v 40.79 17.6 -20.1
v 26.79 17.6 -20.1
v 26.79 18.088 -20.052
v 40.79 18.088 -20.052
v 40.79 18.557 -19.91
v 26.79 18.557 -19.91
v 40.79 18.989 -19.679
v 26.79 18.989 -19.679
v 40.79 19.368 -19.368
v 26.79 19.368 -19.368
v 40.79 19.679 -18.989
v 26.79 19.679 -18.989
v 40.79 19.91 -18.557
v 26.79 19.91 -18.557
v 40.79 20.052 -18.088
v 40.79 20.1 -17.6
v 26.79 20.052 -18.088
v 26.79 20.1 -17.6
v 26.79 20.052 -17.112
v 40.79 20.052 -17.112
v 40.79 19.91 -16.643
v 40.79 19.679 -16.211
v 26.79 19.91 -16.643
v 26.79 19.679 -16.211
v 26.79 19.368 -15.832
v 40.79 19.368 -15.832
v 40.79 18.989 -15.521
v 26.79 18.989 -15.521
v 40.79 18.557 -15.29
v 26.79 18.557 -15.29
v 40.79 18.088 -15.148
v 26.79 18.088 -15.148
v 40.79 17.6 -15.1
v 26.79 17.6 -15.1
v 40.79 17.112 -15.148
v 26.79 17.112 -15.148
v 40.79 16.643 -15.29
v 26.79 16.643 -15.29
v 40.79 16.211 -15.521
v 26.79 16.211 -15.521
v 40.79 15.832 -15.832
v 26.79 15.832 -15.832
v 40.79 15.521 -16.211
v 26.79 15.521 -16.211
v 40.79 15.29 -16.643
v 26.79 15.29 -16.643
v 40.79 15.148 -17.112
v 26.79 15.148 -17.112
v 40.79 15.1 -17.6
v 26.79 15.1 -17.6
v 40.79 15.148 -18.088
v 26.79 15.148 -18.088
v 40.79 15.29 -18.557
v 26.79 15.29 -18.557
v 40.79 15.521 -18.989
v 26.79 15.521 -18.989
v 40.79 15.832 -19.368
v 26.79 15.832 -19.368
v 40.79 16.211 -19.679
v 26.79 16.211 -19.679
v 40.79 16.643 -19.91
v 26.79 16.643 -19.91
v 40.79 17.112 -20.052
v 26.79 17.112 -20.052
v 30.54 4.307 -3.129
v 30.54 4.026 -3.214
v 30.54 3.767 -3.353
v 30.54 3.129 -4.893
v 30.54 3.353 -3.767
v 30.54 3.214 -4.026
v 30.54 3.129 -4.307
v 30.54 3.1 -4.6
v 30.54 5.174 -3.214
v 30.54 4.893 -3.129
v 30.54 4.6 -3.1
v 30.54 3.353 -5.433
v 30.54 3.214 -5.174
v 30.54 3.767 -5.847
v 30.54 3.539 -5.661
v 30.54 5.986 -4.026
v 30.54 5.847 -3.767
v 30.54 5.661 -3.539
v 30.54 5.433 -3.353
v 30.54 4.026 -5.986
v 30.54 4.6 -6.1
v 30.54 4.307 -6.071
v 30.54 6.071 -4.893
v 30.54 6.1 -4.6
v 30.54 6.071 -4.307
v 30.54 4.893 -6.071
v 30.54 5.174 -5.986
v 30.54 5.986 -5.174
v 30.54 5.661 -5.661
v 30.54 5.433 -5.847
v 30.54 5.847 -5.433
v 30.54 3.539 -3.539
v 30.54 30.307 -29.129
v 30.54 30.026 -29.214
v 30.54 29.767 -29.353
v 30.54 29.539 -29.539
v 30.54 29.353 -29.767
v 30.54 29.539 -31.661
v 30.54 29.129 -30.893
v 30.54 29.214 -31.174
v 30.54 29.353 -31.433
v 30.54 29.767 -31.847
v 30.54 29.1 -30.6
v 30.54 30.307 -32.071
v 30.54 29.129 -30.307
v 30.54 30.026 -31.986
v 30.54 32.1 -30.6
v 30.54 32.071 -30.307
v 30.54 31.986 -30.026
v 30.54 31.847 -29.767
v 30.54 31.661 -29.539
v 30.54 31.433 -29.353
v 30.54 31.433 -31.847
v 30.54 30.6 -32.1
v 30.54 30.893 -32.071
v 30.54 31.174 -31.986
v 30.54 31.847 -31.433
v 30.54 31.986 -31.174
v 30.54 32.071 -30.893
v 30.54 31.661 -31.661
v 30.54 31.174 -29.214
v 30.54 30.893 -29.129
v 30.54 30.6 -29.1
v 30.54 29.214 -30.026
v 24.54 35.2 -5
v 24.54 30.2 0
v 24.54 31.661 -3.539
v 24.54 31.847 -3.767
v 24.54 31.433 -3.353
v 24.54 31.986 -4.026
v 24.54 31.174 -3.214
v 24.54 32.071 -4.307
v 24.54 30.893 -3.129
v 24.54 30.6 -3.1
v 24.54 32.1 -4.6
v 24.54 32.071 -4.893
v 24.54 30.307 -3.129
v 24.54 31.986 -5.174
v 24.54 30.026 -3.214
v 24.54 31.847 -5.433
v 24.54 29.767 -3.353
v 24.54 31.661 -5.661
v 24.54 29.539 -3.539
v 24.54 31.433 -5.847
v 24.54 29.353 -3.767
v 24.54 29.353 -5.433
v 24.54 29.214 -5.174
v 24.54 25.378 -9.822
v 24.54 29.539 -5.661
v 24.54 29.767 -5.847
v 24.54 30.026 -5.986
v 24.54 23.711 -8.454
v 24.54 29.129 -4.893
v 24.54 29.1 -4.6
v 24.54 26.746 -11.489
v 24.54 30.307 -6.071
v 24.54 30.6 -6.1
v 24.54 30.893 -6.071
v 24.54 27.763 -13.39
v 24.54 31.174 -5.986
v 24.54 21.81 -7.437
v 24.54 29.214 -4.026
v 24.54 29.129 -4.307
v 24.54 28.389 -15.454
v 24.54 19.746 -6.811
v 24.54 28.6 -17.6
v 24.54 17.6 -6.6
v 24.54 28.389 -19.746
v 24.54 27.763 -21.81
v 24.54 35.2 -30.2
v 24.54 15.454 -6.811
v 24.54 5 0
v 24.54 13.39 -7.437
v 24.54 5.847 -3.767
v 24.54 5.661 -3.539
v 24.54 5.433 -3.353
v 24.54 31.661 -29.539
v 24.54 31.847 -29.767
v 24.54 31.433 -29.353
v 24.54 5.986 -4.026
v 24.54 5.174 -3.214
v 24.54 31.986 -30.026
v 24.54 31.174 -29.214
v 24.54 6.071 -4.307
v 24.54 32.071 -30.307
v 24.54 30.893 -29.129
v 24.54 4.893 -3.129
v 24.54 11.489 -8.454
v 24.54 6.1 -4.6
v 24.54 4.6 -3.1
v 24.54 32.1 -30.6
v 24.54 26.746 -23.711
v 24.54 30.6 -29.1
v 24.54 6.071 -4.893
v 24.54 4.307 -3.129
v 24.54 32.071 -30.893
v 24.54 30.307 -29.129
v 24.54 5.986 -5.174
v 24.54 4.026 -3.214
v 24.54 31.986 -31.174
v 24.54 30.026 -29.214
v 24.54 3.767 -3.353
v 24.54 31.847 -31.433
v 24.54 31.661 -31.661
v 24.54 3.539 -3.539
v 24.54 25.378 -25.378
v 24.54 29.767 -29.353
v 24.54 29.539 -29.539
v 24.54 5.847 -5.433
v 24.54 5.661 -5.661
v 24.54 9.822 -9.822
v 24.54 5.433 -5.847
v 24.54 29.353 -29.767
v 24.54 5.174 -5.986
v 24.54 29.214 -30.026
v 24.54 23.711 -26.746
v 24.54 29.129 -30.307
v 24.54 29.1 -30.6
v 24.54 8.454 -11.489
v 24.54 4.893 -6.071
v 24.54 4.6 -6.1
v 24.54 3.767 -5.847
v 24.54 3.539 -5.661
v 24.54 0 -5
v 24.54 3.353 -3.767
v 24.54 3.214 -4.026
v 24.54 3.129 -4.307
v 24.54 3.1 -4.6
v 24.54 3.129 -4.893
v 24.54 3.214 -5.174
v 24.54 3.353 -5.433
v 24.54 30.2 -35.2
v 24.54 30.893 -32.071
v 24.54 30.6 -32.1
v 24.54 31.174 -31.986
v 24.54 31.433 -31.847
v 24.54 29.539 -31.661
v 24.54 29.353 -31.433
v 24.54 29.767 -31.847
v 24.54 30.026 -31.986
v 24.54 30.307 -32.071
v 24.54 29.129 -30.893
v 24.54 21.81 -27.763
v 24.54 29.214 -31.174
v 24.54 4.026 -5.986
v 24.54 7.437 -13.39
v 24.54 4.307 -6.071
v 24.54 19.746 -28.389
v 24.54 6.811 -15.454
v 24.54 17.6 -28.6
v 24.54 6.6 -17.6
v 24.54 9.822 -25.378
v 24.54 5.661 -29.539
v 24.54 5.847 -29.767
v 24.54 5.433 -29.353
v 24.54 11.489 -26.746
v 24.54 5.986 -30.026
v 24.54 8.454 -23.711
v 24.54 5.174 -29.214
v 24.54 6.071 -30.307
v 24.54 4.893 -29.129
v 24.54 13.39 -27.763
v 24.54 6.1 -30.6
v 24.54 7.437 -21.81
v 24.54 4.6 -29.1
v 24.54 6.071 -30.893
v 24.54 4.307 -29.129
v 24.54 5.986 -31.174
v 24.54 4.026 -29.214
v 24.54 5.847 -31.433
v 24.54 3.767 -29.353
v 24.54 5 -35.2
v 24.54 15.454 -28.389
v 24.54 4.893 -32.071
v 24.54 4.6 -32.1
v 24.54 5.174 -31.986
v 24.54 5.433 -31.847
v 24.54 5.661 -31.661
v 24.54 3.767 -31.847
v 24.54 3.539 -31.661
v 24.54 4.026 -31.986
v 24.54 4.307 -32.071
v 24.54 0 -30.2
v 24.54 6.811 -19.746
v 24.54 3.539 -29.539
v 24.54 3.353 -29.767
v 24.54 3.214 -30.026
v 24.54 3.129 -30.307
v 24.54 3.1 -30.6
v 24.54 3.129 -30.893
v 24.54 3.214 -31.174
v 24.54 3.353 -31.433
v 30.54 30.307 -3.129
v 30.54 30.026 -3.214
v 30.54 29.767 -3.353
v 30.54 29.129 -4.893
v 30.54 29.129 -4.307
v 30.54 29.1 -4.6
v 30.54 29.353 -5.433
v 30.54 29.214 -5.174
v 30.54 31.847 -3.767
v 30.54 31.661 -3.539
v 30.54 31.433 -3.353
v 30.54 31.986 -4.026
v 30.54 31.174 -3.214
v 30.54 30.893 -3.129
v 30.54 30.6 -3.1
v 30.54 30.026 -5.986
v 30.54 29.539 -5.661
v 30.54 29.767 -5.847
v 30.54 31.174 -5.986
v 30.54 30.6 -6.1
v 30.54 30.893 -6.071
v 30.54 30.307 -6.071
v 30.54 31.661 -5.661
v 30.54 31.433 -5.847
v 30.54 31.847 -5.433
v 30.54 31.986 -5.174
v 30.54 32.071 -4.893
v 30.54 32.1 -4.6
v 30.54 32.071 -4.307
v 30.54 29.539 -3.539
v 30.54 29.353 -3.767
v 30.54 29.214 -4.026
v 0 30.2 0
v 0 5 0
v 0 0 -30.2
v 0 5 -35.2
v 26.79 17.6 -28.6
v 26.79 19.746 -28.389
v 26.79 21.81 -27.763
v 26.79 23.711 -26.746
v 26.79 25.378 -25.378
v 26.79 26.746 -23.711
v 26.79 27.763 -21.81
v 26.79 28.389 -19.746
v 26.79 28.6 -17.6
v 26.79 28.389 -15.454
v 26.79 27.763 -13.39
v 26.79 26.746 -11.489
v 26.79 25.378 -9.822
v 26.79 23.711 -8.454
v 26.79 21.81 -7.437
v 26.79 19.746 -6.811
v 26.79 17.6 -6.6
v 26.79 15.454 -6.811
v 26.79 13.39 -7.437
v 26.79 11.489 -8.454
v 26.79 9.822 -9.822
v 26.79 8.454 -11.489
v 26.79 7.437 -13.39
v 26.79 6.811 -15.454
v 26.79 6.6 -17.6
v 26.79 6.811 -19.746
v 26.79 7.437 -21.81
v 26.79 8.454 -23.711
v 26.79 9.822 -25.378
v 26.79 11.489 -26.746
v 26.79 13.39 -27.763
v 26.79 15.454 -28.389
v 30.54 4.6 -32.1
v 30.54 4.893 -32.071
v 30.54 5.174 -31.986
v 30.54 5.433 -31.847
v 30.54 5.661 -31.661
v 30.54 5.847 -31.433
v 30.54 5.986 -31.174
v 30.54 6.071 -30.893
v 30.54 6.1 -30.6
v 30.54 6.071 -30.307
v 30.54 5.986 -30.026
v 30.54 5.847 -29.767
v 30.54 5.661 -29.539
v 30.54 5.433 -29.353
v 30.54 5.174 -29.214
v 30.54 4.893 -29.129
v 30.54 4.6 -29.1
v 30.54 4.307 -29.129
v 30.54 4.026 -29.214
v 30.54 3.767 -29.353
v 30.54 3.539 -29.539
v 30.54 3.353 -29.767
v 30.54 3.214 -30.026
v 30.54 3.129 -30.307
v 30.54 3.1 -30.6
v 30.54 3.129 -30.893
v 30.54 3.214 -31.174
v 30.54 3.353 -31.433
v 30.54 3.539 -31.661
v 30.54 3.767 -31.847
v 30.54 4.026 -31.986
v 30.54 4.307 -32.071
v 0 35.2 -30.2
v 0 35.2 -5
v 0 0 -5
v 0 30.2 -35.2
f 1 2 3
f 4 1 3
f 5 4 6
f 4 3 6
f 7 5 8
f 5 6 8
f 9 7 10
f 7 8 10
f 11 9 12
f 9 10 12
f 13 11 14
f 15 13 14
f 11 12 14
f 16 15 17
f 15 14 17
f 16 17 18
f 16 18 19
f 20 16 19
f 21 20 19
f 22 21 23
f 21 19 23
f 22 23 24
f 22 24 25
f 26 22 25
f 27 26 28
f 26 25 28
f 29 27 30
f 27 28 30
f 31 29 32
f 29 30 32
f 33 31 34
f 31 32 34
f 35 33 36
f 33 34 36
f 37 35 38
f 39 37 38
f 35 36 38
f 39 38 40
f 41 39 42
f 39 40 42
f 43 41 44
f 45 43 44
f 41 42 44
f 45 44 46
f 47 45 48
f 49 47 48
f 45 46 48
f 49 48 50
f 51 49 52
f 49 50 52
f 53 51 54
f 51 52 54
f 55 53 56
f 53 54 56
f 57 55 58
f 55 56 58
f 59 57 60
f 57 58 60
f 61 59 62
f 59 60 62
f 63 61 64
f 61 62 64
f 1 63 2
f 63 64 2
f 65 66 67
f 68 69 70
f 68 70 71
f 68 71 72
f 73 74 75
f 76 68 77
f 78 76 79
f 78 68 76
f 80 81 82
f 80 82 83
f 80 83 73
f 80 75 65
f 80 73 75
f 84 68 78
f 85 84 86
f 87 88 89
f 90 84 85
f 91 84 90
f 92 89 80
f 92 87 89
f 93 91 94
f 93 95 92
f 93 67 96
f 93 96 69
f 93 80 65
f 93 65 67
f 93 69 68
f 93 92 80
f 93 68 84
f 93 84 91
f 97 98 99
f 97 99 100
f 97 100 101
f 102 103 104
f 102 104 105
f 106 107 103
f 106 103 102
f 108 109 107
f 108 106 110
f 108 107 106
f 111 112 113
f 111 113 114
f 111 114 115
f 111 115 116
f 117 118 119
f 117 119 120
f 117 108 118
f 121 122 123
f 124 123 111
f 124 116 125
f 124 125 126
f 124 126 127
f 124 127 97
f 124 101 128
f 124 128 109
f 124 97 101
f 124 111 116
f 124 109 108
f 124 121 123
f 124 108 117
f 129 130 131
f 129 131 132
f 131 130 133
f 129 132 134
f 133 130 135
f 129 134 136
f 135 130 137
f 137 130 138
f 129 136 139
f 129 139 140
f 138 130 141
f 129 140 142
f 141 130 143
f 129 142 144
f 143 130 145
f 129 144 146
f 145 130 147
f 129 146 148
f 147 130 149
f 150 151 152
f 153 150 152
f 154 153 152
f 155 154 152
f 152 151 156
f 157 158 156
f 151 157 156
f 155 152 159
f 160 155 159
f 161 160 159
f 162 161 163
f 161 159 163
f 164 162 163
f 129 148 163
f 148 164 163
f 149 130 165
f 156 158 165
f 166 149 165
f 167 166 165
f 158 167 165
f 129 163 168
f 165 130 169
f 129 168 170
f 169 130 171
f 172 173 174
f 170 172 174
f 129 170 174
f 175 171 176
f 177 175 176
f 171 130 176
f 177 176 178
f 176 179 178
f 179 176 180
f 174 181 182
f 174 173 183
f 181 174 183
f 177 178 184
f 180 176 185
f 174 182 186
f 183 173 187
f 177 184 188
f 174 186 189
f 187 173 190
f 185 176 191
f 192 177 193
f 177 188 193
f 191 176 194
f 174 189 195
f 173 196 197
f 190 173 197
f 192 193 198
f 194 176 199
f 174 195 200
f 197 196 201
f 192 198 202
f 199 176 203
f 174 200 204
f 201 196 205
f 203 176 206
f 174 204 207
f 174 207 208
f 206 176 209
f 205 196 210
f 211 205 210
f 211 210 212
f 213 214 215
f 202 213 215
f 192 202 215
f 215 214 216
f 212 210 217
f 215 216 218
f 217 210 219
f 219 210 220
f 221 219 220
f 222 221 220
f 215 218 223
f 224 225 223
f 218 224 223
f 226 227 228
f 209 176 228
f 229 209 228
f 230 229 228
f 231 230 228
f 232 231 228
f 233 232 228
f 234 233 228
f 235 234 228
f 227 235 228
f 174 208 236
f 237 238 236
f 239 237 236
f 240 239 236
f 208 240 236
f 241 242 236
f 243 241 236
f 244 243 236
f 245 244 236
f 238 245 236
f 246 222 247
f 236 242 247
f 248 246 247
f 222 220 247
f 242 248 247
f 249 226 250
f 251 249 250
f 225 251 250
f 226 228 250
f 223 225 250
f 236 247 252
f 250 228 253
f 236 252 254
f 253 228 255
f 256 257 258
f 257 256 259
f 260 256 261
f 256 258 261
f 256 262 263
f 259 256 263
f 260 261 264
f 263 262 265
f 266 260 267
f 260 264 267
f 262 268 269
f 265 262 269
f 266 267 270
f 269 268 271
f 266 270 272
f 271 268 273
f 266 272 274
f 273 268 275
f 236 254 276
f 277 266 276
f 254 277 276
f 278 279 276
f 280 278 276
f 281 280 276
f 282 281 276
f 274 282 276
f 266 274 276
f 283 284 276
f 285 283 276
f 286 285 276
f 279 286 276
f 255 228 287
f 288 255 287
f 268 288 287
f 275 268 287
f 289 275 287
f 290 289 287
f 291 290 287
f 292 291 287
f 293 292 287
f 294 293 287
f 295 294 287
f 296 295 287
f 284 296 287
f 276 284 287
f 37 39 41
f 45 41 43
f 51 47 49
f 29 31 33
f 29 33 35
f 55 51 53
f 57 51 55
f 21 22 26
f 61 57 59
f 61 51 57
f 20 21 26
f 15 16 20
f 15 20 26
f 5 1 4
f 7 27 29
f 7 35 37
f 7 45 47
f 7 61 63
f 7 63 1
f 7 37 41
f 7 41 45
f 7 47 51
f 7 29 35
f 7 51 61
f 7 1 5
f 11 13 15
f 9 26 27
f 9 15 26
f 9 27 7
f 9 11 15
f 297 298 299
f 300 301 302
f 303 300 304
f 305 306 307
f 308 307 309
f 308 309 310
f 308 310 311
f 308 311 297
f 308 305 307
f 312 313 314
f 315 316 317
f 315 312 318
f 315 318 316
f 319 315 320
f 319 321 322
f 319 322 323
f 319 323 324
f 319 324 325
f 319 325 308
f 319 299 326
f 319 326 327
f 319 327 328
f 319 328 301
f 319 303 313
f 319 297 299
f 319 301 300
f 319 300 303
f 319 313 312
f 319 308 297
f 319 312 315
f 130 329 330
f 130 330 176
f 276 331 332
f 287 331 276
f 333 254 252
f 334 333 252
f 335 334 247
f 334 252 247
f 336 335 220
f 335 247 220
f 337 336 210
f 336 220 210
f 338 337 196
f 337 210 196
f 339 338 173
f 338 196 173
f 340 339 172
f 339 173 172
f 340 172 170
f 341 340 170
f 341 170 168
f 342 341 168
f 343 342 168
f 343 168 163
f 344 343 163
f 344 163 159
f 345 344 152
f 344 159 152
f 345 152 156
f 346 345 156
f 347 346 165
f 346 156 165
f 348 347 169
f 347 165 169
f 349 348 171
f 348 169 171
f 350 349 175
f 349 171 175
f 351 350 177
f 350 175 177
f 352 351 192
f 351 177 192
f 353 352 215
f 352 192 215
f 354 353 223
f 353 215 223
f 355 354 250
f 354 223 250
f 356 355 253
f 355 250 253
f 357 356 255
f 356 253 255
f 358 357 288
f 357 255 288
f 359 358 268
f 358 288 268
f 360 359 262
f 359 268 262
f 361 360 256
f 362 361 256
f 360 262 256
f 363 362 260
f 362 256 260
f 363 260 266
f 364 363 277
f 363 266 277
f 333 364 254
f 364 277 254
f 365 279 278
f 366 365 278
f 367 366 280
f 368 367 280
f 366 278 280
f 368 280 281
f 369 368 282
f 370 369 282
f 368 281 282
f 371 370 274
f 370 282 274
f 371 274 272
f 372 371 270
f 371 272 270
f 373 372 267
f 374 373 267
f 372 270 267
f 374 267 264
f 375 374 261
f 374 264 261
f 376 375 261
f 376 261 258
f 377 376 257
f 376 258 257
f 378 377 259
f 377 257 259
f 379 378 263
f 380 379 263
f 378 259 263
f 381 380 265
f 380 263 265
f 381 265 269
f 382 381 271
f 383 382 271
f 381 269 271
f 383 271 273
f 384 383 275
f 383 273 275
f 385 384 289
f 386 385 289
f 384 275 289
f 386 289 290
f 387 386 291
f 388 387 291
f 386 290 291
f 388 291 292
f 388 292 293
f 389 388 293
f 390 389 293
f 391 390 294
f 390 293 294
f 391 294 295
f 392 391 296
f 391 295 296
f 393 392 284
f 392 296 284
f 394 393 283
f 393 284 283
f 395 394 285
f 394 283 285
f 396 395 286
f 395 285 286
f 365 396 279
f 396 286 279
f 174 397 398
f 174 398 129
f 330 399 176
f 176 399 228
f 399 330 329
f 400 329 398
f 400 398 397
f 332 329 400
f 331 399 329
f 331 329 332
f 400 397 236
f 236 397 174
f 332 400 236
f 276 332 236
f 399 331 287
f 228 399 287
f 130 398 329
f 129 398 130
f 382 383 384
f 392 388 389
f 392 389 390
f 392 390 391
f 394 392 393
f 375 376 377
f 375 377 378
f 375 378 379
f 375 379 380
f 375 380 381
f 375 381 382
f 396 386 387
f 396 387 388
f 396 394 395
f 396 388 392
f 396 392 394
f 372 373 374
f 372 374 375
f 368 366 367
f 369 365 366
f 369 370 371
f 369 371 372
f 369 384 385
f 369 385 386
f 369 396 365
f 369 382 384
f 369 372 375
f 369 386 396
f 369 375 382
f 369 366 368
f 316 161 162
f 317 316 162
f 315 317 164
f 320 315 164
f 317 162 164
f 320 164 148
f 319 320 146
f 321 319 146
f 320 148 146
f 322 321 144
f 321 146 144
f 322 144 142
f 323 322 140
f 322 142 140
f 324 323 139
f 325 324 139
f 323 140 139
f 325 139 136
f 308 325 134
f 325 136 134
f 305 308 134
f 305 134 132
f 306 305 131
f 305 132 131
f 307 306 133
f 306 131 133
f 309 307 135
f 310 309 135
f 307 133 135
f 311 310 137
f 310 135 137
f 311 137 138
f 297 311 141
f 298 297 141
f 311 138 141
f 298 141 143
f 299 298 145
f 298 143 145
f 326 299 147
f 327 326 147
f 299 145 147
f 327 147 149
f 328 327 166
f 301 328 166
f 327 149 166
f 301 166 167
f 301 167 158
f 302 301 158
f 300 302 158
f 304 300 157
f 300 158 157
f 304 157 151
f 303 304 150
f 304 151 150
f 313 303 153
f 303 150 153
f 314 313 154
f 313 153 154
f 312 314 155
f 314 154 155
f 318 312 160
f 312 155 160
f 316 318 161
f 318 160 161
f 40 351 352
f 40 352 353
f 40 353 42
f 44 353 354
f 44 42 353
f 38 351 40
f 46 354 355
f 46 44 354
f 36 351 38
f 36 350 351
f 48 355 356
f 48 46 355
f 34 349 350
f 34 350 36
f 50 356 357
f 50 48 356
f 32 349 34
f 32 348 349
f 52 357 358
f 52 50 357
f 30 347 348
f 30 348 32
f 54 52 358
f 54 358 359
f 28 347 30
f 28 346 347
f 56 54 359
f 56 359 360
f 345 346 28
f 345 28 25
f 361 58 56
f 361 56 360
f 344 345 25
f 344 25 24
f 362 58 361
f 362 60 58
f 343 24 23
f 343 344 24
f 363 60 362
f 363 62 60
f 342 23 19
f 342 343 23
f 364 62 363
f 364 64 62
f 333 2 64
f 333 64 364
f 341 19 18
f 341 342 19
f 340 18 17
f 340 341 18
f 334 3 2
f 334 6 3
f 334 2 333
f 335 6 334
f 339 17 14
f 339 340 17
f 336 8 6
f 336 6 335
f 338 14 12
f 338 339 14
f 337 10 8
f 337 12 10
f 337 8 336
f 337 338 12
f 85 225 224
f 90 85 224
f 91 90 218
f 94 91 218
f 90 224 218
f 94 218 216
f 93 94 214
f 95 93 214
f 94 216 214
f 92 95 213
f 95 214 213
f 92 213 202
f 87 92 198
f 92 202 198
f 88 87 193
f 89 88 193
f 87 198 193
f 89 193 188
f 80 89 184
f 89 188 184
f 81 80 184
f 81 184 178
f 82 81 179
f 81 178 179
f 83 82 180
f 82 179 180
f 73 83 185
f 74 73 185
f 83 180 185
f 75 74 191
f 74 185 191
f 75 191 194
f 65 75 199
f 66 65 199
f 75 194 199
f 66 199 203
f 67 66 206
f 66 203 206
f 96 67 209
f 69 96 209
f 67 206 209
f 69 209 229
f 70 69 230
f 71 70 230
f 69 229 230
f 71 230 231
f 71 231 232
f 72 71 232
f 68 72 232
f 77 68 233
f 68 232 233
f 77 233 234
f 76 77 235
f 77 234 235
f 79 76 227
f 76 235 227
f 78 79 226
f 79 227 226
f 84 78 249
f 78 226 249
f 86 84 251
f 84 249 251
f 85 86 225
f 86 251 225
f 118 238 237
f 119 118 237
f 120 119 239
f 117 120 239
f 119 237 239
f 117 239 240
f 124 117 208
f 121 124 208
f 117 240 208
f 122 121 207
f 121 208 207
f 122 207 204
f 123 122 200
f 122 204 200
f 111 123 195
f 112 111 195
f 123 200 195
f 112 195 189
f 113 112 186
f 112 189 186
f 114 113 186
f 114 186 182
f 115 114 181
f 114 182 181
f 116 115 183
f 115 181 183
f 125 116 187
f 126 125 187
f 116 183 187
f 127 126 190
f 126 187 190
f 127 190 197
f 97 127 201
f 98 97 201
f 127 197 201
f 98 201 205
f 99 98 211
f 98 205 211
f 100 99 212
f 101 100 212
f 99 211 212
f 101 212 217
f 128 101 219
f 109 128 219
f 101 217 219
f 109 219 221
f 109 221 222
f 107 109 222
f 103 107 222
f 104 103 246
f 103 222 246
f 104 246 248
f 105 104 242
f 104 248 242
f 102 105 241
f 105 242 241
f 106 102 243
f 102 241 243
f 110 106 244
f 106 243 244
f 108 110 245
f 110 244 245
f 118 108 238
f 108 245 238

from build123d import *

# Parameters (mm, degrees)
SKETCH1_W           = 24.54
SKETCH1_H           = 35.2
MAIN_BODY_DEPTH     = 35.2
SKETCH2_R           = 11
LIP_DEPTH           = 2.25
SKETCH3_R           = 2.5
SHAFT_DEPTH         = 14
CHAMFER1_SIZE       = 5
SKETCH4_R           = 1.5
BOSS_EXTRUDE4_DEPTH = 6


with BuildPart() as part:
    # Sketch1 → Main body (new body)
    with BuildSketch(Plane(origin=(0, 0, 0), x_dir=(1, 0, 0), z_dir=(0, 1, 0))):
        with Locations((12.27, 17.6)):
            Rectangle(SKETCH1_W, SKETCH1_H)
    extrude(amount=MAIN_BODY_DEPTH)

    # Sketch2 → lip (add)
    with BuildSketch(Plane(origin=(24.54, 0, 0), x_dir=(0, 0, -1), z_dir=(1, 0, 0))):
        with Locations((17.6, 17.6)):
            Circle(SKETCH2_R)
    extrude(amount=LIP_DEPTH)

    # Sketch3 → shaft (add)
    with BuildSketch(Plane(origin=(26.79, 0, 0), x_dir=(0, 0, -1), z_dir=(1, 0, 0))):
        with Locations((17.6, 17.6)):
            Circle(SKETCH3_R)
    extrude(amount=SHAFT_DEPTH)

    # Chamfer1
    chamfer1_edges = [part.edges().sort_by_distance(p)[0] for p in [
        (12.27, 35.2, -35.2),
        (12.27, 0, -35.2),
        (12.27, 0, 0),
        (12.27, 35.2, 0),
    ]]
    chamfer(chamfer1_edges, length=CHAMFER1_SIZE)

    # Sketch4 → Boss-Extrude4 (add)
    with BuildSketch(Plane(origin=(24.54, 0, 0), x_dir=(0, 0, -1), z_dir=(1, 0, 0))):
        with Locations((30.6, 30.6)):
            Circle(SKETCH4_R)
        with Locations((30.6, 4.6)):
            Circle(SKETCH4_R)
        with Locations((4.6, 30.6)):
            Circle(SKETCH4_R)
        with Locations((4.6, 4.6)):
            Circle(SKETCH4_R)
    extrude(amount=BOSS_EXTRUDE4_DEPTH)


solid = part.part
